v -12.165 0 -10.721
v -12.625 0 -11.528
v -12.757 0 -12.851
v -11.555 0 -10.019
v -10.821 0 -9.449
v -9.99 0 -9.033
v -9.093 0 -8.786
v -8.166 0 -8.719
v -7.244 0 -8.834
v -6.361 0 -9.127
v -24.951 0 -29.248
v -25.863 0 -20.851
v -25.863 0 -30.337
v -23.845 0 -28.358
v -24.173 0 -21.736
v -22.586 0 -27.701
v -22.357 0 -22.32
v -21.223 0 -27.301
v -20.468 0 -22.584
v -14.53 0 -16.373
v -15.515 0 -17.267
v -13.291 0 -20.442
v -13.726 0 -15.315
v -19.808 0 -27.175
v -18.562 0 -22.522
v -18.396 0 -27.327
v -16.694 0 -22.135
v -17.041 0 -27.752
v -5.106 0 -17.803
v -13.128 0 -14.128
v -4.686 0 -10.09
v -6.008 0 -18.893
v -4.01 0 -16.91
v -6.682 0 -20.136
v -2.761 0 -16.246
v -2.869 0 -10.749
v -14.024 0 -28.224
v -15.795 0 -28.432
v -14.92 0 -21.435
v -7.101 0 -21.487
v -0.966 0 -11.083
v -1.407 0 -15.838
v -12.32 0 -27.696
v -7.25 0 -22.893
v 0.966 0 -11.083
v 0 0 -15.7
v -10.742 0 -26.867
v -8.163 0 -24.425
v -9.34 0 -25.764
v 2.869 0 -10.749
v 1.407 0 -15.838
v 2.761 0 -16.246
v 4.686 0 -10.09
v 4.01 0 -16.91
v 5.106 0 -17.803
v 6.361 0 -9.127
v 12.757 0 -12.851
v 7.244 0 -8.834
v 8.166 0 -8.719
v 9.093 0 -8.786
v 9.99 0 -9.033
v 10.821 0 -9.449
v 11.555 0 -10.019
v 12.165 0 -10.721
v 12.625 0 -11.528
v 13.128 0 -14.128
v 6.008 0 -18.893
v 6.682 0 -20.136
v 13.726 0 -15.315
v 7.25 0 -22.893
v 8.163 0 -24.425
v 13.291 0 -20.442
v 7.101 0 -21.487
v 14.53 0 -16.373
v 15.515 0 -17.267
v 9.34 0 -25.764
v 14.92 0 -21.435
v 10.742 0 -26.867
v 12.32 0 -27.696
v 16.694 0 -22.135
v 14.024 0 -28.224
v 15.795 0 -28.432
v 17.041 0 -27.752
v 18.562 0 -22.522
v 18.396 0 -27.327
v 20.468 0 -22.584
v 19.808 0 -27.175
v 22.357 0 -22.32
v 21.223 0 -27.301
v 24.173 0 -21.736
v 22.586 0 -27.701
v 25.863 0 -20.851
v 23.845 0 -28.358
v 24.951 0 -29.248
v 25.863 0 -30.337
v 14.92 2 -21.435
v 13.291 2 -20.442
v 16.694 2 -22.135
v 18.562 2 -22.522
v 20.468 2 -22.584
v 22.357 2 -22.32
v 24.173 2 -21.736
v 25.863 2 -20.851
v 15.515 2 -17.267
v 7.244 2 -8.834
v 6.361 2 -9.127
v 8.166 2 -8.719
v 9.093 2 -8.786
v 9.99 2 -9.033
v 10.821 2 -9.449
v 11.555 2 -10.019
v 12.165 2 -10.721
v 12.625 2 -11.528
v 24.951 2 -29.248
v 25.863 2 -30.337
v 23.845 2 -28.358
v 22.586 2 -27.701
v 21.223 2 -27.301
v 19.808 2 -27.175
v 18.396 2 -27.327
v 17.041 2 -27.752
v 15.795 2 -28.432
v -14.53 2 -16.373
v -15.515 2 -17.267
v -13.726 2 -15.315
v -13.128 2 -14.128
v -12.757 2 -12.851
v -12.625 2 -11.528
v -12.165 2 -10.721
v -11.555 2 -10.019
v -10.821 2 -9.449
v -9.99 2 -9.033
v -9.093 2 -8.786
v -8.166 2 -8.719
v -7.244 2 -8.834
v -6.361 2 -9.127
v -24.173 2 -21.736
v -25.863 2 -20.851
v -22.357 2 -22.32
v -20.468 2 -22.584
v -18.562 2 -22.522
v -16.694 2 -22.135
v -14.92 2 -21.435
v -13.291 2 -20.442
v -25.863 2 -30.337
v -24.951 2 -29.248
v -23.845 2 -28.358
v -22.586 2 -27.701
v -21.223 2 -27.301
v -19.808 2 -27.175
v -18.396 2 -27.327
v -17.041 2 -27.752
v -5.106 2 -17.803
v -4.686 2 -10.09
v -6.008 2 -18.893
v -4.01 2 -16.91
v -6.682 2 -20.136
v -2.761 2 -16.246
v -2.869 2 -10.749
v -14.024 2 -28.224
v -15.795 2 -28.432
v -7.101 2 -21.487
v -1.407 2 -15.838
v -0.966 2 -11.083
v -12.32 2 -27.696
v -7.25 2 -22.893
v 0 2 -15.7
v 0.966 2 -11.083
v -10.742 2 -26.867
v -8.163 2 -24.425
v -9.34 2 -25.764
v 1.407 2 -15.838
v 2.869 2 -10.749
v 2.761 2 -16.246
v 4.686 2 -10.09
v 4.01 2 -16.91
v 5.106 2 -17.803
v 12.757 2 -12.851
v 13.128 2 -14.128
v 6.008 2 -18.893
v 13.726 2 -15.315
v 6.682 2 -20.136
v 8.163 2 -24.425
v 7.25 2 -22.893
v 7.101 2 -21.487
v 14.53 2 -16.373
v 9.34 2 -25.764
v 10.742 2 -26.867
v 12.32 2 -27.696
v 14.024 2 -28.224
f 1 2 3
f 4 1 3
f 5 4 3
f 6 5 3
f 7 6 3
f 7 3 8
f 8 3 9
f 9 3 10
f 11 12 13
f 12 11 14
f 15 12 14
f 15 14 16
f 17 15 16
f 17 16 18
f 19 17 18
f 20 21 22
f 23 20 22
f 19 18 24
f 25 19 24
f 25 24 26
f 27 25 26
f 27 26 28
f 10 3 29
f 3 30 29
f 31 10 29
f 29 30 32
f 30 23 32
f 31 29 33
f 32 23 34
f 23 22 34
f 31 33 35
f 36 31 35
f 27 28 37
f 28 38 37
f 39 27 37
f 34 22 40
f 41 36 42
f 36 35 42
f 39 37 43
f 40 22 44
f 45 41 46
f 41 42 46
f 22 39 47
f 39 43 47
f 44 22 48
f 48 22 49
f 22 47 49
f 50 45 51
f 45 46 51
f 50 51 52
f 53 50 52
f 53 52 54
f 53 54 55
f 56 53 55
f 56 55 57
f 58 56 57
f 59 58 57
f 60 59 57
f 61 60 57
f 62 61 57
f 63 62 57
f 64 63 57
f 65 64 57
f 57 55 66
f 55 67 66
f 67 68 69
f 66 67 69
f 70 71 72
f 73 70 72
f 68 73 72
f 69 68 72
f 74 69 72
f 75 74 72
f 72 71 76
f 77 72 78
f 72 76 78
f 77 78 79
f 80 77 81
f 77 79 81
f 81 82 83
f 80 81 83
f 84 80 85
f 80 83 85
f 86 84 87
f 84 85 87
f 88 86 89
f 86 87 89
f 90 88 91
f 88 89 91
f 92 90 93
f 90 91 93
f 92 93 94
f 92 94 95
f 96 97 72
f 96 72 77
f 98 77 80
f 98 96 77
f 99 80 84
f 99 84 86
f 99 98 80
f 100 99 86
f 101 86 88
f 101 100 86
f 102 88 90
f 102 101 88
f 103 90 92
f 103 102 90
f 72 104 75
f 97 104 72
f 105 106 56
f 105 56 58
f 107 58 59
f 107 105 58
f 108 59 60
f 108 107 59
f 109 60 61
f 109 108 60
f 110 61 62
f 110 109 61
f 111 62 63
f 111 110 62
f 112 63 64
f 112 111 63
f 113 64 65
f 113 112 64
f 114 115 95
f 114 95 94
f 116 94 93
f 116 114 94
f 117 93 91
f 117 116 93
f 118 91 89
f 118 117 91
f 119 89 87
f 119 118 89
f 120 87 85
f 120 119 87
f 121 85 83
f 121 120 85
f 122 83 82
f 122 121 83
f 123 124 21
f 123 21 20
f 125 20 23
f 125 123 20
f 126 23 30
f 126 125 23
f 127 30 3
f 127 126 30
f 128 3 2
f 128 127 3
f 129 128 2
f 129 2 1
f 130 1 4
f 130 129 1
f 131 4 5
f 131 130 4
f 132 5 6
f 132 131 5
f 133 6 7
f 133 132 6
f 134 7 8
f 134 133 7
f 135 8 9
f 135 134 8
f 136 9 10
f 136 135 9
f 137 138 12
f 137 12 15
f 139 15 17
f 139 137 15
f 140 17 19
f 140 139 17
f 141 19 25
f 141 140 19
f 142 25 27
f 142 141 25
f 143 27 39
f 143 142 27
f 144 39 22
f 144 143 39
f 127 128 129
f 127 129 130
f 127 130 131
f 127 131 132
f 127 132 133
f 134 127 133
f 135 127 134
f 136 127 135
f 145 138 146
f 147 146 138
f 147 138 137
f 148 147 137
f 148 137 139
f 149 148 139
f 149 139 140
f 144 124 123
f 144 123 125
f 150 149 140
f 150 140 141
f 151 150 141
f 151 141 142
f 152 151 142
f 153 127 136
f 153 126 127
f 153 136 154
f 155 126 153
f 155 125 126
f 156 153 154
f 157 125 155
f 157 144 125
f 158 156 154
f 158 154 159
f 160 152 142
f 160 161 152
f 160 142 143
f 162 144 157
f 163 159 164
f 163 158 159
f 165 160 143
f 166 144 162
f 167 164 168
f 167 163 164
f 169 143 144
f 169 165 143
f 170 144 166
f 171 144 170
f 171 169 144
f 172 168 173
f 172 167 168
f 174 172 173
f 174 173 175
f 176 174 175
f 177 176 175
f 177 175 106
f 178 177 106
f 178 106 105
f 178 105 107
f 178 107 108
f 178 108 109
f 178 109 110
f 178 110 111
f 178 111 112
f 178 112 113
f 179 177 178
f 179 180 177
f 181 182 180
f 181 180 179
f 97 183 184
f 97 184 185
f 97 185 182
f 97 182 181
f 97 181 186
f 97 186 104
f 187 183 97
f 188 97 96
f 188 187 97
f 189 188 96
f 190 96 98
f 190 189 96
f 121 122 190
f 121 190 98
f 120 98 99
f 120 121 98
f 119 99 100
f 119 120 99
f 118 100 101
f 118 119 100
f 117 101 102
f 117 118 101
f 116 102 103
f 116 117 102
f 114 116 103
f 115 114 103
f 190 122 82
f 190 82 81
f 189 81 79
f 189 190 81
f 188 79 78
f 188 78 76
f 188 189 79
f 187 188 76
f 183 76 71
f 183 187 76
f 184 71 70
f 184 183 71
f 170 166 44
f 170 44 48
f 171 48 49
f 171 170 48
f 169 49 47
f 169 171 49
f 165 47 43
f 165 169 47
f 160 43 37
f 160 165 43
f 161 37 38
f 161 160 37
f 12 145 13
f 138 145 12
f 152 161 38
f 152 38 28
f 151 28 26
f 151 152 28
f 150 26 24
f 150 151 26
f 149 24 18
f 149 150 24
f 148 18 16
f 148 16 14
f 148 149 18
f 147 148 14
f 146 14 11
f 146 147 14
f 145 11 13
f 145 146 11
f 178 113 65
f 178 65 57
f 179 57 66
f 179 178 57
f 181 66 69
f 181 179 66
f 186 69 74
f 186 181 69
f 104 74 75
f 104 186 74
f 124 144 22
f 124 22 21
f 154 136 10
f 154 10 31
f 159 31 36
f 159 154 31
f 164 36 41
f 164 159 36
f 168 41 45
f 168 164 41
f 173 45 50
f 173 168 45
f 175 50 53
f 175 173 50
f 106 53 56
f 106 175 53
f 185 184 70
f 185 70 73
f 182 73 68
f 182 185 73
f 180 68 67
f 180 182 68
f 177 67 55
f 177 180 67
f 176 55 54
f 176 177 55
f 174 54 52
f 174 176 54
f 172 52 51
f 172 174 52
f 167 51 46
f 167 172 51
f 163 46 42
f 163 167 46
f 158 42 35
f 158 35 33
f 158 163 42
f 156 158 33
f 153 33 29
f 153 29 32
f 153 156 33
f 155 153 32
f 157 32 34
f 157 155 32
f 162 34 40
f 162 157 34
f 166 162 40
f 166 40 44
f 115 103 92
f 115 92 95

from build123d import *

# Parameters (mm, degrees)
BOSS_EXTRUDE1_DEPTH = 2
SKETCH5_W           = 68.030538665
SKETCH5_H           = 29.277015507
CUT_EXTRUDE3_DEPTH  = 2


with BuildPart() as part:
    # Sketch3 → Boss-Extrude1 (new body)
    with BuildSketch(Plane(origin=(0, 0, 0), x_dir=(1, 0, 0), z_dir=(0, 1, 0))):
        with BuildLine():
            Line((-13.637639272, 20.383278482), (-15.860247962, 17.20906431))
            ThreePointArc((-15.860247962, 17.20906431), (-13.666207185, 14.707240293), (-12.875283017, 11.475))
            ThreePointArc((-12.875283017, 11.475), (-10.092914311, 8.804356775), (-6.237643745, 8.908278482))
            ThreePointArc((-6.237643745, 8.908278482), (0, 10.875), (6.237643745, 8.908278482))
            ThreePointArc((6.237643745, 8.908278482), (10.092914311, 8.804356775), (12.875283017, 11.475))
            ThreePointArc((12.875283017, 11.475), (13.666207185, 14.707240293), (15.860247962, 17.20906431))
            Line((15.860247962, 17.20906431), (13.637639272, 20.383278482))
            ThreePointArc((13.637639272, 20.383278482), (19.875283017, 22.35), (26.112926762, 20.383278482))
            Line((26.112926762, 20.383278482), (26.112926762, 31.248240565))
            ThreePointArc((26.112926762, 31.248240565), (21.575193898, 27.634543241), (15.870079226, 28.68406431))
            ThreePointArc((15.870079226, 28.68406431), (10.616247764, 27.083629141), (7, 22.95))
            ThreePointArc((7, 22.95), (0, 15.95), (-7, 22.95))
            ThreePointArc((-7, 22.95), (-10.616247764, 27.083629141), (-15.870079226, 28.68406431))
            ThreePointArc((-15.870079226, 28.68406431), (-21.575193898, 27.634543241), (-26.112926762, 31.248240565))
            Line((-26.112926762, 31.248240565), (-26.112926762, 20.383278482))
            ThreePointArc((-26.112926762, 20.383278482), (-19.875283017, 22.35), (-13.637639272, 20.383278482))
        make_face()
    extrude(amount=BOSS_EXTRUDE1_DEPTH)

    # Sketch5 → Cut-Extrude3 (cut)
    with BuildSketch(Plane(origin=(0, 2, 0), x_dir=(1, 0, 0), z_dir=(0, 1, 0))):
        with Locations((1.906858247, 20.166215681)):
            Rectangle(SKETCH5_W, SKETCH5_H)
        with BuildLine():
            Line((25.862926762, 20.851233112), (25.862926762, 30.337137187))
            ThreePointArc((25.862926762, 30.337137187), (21.222970901, 27.301360666), (15.794718469, 28.432380125))
            ThreePointArc((15.794718469, 28.432380125), (10.741632002, 26.866985754), (7.249777379, 22.893184845))
            ThreePointArc((7.249777379, 22.893184845), (0, 15.7), (-7.249777379, 22.893184845))
            ThreePointArc((-7.249777379, 22.893184845), (-10.741632002, 26.866985754), (-15.794718469, 28.432380125))
            ThreePointArc((-15.794718469, 28.432380125), (-21.222970901, 27.301360666), (-25.862926762, 30.337137187))
            Line((-25.862926762, 30.337137187), (-25.862926762, 20.851233112))
            ThreePointArc((-25.862926762, 20.851233112), (-19.513666923, 22.594121314), (-13.291068525, 20.442371104))
            Line((-13.291068525, 20.442371104), (-15.51453889, 17.266926334))
            ThreePointArc((-15.51453889, 17.266926334), (-13.399579679, 14.735025503), (-12.625477511, 11.528104843))
            ThreePointArc((-12.625477511, 11.528104843), (-9.989809939, 9.032549256), (-6.361359115, 9.126814078))
            ThreePointArc((-6.361359115, 9.126814078), (0, 11.125), (6.361359115, 9.126814078))
            ThreePointArc((6.361359115, 9.126814078), (9.989809939, 9.032549256), (12.625477511, 11.528104843))
            ThreePointArc((12.625477511, 11.528104843), (13.399579679, 14.735025503), (15.51453889, 17.266926334))
            Line((15.51453889, 17.266926334), (13.291068525, 20.442371104))
            ThreePointArc((13.291068525, 20.442371104), (19.513666923, 22.594121314), (25.862926762, 20.851233112))
        make_face(mode=Mode.SUBTRACT)
    extrude(amount=-CUT_EXTRUDE3_DEPTH, mode=Mode.SUBTRACT)


solid = part.part
